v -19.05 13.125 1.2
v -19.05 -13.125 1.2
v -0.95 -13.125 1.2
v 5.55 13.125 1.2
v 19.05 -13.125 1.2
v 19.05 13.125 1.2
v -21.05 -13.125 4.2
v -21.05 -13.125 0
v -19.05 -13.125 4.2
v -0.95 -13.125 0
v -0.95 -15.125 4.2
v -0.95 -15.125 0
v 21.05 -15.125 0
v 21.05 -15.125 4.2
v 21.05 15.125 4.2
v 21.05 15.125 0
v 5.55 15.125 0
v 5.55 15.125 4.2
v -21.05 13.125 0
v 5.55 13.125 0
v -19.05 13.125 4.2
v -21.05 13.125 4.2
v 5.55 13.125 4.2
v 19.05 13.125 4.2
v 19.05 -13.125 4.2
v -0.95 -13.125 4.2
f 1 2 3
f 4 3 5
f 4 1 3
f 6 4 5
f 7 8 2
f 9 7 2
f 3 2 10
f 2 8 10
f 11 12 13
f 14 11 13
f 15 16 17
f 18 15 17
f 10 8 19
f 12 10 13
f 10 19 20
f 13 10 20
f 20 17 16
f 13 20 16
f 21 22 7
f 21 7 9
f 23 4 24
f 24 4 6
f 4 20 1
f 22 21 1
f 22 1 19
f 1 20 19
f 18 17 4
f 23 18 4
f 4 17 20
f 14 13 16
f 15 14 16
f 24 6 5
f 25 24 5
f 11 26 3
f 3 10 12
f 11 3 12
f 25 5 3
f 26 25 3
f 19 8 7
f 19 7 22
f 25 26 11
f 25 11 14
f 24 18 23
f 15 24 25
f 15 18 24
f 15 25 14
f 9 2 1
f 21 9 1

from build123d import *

# Parameters (mm, degrees)
F0_W     = 2
F0_H     = 26.25
F1_DEPTH = 4.2
F2_DEPTH = 1.2


with BuildPart() as f1:
    # F0 (on Top) → F1 (new body)
    with BuildSketch(Plane.XY):
        Polygon((21.05, -15.125), (21.05, 15.125), (5.55, 15.125), (5.55, 13.125), (19.05, 13.125), (19.05, -13.125), (-0.95, -13.125), (-0.95, -15.125), align=None)
        with Locations((-20.05, 0)):
            Rectangle(F0_W, F0_H)
    extrude(amount=F1_DEPTH)

    # F0 (on Top) → F2 (join)
    with BuildSketch(Plane.XY):
        Polygon((19.05, 13.125), (5.55, 13.125), (0.55, 13.125), (-19.05, 13.125), (-19.05, -13.125), (-0.95, -13.125), (19.05, -13.125), align=None)
    extrude(amount=F2_DEPTH)


solid = f1.part
